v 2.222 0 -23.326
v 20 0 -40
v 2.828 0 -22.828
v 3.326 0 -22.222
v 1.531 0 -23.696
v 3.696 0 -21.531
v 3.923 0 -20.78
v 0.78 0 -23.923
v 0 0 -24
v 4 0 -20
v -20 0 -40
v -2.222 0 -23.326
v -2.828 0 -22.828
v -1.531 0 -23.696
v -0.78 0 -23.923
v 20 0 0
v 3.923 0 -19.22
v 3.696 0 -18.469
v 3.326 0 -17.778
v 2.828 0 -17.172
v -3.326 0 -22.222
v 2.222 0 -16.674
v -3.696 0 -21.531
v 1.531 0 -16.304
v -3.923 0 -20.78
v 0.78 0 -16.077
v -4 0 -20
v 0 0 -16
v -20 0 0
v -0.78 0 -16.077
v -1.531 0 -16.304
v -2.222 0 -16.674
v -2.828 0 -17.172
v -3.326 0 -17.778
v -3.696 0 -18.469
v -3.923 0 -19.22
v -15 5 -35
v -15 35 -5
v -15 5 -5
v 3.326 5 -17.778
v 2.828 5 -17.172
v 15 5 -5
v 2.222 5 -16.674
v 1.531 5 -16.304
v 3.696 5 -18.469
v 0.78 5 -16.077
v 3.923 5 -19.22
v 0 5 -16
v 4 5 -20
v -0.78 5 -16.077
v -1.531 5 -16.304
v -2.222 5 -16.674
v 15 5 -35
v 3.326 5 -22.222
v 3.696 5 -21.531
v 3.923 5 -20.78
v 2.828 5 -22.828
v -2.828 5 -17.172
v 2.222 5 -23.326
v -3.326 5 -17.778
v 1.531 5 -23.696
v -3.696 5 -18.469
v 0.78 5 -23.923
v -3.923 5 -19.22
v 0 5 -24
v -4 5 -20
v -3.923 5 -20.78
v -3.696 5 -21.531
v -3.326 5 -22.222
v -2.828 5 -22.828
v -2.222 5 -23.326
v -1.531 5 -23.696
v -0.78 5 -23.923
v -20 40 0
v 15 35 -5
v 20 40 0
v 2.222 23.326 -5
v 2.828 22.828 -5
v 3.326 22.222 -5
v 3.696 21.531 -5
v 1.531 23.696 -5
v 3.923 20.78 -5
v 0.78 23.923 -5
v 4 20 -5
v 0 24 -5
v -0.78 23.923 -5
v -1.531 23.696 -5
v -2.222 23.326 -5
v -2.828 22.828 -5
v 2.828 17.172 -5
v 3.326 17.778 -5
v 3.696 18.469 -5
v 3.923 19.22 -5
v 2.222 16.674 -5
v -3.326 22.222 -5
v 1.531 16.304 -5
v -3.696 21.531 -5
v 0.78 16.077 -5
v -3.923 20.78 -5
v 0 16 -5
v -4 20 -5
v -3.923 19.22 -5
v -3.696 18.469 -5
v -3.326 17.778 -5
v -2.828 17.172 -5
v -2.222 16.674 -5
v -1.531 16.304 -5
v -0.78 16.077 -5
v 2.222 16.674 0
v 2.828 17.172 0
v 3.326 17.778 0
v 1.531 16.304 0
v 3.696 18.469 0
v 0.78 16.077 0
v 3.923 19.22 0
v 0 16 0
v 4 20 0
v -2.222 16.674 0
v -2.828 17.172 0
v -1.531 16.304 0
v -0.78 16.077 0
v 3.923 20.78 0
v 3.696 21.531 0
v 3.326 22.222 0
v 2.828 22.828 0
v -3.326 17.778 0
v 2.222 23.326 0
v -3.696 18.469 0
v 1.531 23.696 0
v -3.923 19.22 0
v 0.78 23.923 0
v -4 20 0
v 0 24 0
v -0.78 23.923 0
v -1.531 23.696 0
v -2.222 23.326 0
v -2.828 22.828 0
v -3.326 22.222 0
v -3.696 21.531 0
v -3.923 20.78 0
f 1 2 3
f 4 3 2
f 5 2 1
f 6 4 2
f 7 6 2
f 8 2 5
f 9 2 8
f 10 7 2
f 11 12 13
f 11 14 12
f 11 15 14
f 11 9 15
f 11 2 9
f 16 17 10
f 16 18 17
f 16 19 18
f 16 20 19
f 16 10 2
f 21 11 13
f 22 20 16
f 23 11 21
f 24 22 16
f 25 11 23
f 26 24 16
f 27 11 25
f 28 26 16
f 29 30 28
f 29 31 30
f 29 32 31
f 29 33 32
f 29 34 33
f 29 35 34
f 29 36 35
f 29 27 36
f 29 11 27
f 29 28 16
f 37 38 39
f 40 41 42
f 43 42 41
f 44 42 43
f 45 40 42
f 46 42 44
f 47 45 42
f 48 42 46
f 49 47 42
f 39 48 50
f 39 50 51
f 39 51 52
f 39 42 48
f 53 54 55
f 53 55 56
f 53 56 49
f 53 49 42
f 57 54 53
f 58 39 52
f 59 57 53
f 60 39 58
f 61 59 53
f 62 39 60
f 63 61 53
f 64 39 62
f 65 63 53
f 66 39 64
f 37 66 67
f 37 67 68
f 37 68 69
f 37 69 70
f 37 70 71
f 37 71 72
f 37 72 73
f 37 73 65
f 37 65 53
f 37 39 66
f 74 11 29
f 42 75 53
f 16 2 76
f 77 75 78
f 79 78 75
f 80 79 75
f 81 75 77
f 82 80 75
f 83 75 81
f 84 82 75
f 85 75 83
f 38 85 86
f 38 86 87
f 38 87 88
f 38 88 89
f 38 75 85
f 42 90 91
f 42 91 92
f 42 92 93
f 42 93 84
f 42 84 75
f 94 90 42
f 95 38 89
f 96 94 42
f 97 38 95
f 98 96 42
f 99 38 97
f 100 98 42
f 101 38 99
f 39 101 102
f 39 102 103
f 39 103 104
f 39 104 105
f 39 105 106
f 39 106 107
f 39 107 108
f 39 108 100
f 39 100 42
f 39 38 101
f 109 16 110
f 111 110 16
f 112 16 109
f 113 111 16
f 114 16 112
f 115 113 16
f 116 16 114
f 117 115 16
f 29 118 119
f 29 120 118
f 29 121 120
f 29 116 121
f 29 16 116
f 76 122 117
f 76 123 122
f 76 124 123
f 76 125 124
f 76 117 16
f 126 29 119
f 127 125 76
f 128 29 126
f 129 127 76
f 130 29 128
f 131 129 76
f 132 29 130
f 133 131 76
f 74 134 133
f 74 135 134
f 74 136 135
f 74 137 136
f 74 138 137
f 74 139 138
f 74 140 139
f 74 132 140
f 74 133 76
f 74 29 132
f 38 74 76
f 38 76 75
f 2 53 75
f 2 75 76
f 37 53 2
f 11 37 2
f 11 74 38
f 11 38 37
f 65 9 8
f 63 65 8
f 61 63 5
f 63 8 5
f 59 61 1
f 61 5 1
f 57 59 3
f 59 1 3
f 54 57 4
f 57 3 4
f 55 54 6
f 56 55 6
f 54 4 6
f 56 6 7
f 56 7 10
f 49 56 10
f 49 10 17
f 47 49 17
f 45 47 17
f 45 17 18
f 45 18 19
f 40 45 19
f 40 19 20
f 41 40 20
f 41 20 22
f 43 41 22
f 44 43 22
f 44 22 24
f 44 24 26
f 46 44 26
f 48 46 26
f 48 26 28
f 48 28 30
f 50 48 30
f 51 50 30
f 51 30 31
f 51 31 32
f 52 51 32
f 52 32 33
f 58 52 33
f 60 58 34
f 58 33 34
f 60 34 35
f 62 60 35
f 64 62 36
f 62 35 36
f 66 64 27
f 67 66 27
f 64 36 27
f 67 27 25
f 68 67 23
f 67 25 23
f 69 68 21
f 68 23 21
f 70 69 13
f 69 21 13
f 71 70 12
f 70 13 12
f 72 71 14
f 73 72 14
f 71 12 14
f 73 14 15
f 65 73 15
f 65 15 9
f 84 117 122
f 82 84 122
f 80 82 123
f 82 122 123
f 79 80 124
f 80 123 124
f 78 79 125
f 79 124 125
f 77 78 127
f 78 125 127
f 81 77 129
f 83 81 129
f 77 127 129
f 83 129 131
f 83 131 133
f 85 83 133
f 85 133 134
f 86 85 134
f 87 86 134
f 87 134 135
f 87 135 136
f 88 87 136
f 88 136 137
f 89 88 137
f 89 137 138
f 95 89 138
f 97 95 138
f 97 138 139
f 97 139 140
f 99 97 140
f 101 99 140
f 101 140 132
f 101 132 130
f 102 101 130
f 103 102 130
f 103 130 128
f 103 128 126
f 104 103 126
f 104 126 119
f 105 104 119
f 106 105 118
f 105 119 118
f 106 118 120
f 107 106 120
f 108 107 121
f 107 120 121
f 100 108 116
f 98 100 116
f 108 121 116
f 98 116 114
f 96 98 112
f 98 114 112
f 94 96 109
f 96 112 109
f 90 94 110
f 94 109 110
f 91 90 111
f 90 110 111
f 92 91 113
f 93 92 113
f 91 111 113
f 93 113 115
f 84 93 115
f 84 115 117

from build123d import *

# Parameters (mm, degrees)
AUFSATZ_LINEAR_AUSTRAGEN1_DEPTH      = 20
AUFSATZ_LINEAR_AUSTRAGEN1_DEPTH_BACK = 20
SCHNITT_LINEAR_AUSTRAGEN1_DEPTH      = 15
SCHNITT_LINEAR_AUSTRAGEN1_DEPTH_BACK = 15
SCHNITT_LINEAR_AUSTRAGEN2_REACH      = 62
SKIZZE3_R                            = 4
SCHNITT_LINEAR_AUSTRAGEN3_REACH      = 62
SKIZZE4_R                            = 4


with BuildPart() as part:
    # Skizze1 → Aufsatz-Linear austragen1 (new, two sides: drawn at the far end of the back side and taken through both)
    with BuildSketch(Plane(origin=(0, 0, 0), x_dir=(0, 0, -1), z_dir=(1, 0, 0)).offset(-AUFSATZ_LINEAR_AUSTRAGEN1_DEPTH_BACK)):
        Polygon((0, 0), (0, 40), (40, 0), align=None)
    extrude(amount=AUFSATZ_LINEAR_AUSTRAGEN1_DEPTH + AUFSATZ_LINEAR_AUSTRAGEN1_DEPTH_BACK)

    # Skizze2 → Schnitt-Linear austragen1 (cut, two sides: drawn at the far end of the back side and taken through both)
    with BuildSketch(Plane(origin=(0, 0, 0), x_dir=(0, 0, -1), z_dir=(1, 0, 0)).offset(-SCHNITT_LINEAR_AUSTRAGEN1_DEPTH_BACK)):
        Polygon((5, 35), (5, 5), (35, 5), align=None)
    extrude(amount=SCHNITT_LINEAR_AUSTRAGEN1_DEPTH + SCHNITT_LINEAR_AUSTRAGEN1_DEPTH_BACK, mode=Mode.SUBTRACT)

    # Skizze3 → Schnitt-Linear austragen2 (cut, up to next)
    with BuildSketch(Plane.XY, mode=Mode.PRIVATE) as schnitt_linear_austragen2_sk1:
        with Locations((0, 20)):
            Circle(SKIZZE3_R)
    schnitt_linear_austragen2_tool1 = extrude(schnitt_linear_austragen2_sk1.sketch, amount=-SCHNITT_LINEAR_AUSTRAGEN2_REACH, mode=Mode.PRIVATE) & part.part
    add(schnitt_linear_austragen2_tool1.solids().sort_by_distance((0, 20, 0))[0], mode=Mode.SUBTRACT)

    # Skizze4 → Schnitt-Linear austragen3 (cut, up to next)
    with BuildSketch(Plane.XZ, mode=Mode.PRIVATE) as schnitt_linear_austragen3_sk1:
        with Locations((0, -20)):
            Circle(SKIZZE4_R)
    schnitt_linear_austragen3_tool1 = extrude(schnitt_linear_austragen3_sk1.sketch, amount=-SCHNITT_LINEAR_AUSTRAGEN3_REACH, mode=Mode.PRIVATE) & part.part
    add(schnitt_linear_austragen3_tool1.solids().sort_by_distance((0, 0, -20))[0], mode=Mode.SUBTRACT)


solid = part.part
